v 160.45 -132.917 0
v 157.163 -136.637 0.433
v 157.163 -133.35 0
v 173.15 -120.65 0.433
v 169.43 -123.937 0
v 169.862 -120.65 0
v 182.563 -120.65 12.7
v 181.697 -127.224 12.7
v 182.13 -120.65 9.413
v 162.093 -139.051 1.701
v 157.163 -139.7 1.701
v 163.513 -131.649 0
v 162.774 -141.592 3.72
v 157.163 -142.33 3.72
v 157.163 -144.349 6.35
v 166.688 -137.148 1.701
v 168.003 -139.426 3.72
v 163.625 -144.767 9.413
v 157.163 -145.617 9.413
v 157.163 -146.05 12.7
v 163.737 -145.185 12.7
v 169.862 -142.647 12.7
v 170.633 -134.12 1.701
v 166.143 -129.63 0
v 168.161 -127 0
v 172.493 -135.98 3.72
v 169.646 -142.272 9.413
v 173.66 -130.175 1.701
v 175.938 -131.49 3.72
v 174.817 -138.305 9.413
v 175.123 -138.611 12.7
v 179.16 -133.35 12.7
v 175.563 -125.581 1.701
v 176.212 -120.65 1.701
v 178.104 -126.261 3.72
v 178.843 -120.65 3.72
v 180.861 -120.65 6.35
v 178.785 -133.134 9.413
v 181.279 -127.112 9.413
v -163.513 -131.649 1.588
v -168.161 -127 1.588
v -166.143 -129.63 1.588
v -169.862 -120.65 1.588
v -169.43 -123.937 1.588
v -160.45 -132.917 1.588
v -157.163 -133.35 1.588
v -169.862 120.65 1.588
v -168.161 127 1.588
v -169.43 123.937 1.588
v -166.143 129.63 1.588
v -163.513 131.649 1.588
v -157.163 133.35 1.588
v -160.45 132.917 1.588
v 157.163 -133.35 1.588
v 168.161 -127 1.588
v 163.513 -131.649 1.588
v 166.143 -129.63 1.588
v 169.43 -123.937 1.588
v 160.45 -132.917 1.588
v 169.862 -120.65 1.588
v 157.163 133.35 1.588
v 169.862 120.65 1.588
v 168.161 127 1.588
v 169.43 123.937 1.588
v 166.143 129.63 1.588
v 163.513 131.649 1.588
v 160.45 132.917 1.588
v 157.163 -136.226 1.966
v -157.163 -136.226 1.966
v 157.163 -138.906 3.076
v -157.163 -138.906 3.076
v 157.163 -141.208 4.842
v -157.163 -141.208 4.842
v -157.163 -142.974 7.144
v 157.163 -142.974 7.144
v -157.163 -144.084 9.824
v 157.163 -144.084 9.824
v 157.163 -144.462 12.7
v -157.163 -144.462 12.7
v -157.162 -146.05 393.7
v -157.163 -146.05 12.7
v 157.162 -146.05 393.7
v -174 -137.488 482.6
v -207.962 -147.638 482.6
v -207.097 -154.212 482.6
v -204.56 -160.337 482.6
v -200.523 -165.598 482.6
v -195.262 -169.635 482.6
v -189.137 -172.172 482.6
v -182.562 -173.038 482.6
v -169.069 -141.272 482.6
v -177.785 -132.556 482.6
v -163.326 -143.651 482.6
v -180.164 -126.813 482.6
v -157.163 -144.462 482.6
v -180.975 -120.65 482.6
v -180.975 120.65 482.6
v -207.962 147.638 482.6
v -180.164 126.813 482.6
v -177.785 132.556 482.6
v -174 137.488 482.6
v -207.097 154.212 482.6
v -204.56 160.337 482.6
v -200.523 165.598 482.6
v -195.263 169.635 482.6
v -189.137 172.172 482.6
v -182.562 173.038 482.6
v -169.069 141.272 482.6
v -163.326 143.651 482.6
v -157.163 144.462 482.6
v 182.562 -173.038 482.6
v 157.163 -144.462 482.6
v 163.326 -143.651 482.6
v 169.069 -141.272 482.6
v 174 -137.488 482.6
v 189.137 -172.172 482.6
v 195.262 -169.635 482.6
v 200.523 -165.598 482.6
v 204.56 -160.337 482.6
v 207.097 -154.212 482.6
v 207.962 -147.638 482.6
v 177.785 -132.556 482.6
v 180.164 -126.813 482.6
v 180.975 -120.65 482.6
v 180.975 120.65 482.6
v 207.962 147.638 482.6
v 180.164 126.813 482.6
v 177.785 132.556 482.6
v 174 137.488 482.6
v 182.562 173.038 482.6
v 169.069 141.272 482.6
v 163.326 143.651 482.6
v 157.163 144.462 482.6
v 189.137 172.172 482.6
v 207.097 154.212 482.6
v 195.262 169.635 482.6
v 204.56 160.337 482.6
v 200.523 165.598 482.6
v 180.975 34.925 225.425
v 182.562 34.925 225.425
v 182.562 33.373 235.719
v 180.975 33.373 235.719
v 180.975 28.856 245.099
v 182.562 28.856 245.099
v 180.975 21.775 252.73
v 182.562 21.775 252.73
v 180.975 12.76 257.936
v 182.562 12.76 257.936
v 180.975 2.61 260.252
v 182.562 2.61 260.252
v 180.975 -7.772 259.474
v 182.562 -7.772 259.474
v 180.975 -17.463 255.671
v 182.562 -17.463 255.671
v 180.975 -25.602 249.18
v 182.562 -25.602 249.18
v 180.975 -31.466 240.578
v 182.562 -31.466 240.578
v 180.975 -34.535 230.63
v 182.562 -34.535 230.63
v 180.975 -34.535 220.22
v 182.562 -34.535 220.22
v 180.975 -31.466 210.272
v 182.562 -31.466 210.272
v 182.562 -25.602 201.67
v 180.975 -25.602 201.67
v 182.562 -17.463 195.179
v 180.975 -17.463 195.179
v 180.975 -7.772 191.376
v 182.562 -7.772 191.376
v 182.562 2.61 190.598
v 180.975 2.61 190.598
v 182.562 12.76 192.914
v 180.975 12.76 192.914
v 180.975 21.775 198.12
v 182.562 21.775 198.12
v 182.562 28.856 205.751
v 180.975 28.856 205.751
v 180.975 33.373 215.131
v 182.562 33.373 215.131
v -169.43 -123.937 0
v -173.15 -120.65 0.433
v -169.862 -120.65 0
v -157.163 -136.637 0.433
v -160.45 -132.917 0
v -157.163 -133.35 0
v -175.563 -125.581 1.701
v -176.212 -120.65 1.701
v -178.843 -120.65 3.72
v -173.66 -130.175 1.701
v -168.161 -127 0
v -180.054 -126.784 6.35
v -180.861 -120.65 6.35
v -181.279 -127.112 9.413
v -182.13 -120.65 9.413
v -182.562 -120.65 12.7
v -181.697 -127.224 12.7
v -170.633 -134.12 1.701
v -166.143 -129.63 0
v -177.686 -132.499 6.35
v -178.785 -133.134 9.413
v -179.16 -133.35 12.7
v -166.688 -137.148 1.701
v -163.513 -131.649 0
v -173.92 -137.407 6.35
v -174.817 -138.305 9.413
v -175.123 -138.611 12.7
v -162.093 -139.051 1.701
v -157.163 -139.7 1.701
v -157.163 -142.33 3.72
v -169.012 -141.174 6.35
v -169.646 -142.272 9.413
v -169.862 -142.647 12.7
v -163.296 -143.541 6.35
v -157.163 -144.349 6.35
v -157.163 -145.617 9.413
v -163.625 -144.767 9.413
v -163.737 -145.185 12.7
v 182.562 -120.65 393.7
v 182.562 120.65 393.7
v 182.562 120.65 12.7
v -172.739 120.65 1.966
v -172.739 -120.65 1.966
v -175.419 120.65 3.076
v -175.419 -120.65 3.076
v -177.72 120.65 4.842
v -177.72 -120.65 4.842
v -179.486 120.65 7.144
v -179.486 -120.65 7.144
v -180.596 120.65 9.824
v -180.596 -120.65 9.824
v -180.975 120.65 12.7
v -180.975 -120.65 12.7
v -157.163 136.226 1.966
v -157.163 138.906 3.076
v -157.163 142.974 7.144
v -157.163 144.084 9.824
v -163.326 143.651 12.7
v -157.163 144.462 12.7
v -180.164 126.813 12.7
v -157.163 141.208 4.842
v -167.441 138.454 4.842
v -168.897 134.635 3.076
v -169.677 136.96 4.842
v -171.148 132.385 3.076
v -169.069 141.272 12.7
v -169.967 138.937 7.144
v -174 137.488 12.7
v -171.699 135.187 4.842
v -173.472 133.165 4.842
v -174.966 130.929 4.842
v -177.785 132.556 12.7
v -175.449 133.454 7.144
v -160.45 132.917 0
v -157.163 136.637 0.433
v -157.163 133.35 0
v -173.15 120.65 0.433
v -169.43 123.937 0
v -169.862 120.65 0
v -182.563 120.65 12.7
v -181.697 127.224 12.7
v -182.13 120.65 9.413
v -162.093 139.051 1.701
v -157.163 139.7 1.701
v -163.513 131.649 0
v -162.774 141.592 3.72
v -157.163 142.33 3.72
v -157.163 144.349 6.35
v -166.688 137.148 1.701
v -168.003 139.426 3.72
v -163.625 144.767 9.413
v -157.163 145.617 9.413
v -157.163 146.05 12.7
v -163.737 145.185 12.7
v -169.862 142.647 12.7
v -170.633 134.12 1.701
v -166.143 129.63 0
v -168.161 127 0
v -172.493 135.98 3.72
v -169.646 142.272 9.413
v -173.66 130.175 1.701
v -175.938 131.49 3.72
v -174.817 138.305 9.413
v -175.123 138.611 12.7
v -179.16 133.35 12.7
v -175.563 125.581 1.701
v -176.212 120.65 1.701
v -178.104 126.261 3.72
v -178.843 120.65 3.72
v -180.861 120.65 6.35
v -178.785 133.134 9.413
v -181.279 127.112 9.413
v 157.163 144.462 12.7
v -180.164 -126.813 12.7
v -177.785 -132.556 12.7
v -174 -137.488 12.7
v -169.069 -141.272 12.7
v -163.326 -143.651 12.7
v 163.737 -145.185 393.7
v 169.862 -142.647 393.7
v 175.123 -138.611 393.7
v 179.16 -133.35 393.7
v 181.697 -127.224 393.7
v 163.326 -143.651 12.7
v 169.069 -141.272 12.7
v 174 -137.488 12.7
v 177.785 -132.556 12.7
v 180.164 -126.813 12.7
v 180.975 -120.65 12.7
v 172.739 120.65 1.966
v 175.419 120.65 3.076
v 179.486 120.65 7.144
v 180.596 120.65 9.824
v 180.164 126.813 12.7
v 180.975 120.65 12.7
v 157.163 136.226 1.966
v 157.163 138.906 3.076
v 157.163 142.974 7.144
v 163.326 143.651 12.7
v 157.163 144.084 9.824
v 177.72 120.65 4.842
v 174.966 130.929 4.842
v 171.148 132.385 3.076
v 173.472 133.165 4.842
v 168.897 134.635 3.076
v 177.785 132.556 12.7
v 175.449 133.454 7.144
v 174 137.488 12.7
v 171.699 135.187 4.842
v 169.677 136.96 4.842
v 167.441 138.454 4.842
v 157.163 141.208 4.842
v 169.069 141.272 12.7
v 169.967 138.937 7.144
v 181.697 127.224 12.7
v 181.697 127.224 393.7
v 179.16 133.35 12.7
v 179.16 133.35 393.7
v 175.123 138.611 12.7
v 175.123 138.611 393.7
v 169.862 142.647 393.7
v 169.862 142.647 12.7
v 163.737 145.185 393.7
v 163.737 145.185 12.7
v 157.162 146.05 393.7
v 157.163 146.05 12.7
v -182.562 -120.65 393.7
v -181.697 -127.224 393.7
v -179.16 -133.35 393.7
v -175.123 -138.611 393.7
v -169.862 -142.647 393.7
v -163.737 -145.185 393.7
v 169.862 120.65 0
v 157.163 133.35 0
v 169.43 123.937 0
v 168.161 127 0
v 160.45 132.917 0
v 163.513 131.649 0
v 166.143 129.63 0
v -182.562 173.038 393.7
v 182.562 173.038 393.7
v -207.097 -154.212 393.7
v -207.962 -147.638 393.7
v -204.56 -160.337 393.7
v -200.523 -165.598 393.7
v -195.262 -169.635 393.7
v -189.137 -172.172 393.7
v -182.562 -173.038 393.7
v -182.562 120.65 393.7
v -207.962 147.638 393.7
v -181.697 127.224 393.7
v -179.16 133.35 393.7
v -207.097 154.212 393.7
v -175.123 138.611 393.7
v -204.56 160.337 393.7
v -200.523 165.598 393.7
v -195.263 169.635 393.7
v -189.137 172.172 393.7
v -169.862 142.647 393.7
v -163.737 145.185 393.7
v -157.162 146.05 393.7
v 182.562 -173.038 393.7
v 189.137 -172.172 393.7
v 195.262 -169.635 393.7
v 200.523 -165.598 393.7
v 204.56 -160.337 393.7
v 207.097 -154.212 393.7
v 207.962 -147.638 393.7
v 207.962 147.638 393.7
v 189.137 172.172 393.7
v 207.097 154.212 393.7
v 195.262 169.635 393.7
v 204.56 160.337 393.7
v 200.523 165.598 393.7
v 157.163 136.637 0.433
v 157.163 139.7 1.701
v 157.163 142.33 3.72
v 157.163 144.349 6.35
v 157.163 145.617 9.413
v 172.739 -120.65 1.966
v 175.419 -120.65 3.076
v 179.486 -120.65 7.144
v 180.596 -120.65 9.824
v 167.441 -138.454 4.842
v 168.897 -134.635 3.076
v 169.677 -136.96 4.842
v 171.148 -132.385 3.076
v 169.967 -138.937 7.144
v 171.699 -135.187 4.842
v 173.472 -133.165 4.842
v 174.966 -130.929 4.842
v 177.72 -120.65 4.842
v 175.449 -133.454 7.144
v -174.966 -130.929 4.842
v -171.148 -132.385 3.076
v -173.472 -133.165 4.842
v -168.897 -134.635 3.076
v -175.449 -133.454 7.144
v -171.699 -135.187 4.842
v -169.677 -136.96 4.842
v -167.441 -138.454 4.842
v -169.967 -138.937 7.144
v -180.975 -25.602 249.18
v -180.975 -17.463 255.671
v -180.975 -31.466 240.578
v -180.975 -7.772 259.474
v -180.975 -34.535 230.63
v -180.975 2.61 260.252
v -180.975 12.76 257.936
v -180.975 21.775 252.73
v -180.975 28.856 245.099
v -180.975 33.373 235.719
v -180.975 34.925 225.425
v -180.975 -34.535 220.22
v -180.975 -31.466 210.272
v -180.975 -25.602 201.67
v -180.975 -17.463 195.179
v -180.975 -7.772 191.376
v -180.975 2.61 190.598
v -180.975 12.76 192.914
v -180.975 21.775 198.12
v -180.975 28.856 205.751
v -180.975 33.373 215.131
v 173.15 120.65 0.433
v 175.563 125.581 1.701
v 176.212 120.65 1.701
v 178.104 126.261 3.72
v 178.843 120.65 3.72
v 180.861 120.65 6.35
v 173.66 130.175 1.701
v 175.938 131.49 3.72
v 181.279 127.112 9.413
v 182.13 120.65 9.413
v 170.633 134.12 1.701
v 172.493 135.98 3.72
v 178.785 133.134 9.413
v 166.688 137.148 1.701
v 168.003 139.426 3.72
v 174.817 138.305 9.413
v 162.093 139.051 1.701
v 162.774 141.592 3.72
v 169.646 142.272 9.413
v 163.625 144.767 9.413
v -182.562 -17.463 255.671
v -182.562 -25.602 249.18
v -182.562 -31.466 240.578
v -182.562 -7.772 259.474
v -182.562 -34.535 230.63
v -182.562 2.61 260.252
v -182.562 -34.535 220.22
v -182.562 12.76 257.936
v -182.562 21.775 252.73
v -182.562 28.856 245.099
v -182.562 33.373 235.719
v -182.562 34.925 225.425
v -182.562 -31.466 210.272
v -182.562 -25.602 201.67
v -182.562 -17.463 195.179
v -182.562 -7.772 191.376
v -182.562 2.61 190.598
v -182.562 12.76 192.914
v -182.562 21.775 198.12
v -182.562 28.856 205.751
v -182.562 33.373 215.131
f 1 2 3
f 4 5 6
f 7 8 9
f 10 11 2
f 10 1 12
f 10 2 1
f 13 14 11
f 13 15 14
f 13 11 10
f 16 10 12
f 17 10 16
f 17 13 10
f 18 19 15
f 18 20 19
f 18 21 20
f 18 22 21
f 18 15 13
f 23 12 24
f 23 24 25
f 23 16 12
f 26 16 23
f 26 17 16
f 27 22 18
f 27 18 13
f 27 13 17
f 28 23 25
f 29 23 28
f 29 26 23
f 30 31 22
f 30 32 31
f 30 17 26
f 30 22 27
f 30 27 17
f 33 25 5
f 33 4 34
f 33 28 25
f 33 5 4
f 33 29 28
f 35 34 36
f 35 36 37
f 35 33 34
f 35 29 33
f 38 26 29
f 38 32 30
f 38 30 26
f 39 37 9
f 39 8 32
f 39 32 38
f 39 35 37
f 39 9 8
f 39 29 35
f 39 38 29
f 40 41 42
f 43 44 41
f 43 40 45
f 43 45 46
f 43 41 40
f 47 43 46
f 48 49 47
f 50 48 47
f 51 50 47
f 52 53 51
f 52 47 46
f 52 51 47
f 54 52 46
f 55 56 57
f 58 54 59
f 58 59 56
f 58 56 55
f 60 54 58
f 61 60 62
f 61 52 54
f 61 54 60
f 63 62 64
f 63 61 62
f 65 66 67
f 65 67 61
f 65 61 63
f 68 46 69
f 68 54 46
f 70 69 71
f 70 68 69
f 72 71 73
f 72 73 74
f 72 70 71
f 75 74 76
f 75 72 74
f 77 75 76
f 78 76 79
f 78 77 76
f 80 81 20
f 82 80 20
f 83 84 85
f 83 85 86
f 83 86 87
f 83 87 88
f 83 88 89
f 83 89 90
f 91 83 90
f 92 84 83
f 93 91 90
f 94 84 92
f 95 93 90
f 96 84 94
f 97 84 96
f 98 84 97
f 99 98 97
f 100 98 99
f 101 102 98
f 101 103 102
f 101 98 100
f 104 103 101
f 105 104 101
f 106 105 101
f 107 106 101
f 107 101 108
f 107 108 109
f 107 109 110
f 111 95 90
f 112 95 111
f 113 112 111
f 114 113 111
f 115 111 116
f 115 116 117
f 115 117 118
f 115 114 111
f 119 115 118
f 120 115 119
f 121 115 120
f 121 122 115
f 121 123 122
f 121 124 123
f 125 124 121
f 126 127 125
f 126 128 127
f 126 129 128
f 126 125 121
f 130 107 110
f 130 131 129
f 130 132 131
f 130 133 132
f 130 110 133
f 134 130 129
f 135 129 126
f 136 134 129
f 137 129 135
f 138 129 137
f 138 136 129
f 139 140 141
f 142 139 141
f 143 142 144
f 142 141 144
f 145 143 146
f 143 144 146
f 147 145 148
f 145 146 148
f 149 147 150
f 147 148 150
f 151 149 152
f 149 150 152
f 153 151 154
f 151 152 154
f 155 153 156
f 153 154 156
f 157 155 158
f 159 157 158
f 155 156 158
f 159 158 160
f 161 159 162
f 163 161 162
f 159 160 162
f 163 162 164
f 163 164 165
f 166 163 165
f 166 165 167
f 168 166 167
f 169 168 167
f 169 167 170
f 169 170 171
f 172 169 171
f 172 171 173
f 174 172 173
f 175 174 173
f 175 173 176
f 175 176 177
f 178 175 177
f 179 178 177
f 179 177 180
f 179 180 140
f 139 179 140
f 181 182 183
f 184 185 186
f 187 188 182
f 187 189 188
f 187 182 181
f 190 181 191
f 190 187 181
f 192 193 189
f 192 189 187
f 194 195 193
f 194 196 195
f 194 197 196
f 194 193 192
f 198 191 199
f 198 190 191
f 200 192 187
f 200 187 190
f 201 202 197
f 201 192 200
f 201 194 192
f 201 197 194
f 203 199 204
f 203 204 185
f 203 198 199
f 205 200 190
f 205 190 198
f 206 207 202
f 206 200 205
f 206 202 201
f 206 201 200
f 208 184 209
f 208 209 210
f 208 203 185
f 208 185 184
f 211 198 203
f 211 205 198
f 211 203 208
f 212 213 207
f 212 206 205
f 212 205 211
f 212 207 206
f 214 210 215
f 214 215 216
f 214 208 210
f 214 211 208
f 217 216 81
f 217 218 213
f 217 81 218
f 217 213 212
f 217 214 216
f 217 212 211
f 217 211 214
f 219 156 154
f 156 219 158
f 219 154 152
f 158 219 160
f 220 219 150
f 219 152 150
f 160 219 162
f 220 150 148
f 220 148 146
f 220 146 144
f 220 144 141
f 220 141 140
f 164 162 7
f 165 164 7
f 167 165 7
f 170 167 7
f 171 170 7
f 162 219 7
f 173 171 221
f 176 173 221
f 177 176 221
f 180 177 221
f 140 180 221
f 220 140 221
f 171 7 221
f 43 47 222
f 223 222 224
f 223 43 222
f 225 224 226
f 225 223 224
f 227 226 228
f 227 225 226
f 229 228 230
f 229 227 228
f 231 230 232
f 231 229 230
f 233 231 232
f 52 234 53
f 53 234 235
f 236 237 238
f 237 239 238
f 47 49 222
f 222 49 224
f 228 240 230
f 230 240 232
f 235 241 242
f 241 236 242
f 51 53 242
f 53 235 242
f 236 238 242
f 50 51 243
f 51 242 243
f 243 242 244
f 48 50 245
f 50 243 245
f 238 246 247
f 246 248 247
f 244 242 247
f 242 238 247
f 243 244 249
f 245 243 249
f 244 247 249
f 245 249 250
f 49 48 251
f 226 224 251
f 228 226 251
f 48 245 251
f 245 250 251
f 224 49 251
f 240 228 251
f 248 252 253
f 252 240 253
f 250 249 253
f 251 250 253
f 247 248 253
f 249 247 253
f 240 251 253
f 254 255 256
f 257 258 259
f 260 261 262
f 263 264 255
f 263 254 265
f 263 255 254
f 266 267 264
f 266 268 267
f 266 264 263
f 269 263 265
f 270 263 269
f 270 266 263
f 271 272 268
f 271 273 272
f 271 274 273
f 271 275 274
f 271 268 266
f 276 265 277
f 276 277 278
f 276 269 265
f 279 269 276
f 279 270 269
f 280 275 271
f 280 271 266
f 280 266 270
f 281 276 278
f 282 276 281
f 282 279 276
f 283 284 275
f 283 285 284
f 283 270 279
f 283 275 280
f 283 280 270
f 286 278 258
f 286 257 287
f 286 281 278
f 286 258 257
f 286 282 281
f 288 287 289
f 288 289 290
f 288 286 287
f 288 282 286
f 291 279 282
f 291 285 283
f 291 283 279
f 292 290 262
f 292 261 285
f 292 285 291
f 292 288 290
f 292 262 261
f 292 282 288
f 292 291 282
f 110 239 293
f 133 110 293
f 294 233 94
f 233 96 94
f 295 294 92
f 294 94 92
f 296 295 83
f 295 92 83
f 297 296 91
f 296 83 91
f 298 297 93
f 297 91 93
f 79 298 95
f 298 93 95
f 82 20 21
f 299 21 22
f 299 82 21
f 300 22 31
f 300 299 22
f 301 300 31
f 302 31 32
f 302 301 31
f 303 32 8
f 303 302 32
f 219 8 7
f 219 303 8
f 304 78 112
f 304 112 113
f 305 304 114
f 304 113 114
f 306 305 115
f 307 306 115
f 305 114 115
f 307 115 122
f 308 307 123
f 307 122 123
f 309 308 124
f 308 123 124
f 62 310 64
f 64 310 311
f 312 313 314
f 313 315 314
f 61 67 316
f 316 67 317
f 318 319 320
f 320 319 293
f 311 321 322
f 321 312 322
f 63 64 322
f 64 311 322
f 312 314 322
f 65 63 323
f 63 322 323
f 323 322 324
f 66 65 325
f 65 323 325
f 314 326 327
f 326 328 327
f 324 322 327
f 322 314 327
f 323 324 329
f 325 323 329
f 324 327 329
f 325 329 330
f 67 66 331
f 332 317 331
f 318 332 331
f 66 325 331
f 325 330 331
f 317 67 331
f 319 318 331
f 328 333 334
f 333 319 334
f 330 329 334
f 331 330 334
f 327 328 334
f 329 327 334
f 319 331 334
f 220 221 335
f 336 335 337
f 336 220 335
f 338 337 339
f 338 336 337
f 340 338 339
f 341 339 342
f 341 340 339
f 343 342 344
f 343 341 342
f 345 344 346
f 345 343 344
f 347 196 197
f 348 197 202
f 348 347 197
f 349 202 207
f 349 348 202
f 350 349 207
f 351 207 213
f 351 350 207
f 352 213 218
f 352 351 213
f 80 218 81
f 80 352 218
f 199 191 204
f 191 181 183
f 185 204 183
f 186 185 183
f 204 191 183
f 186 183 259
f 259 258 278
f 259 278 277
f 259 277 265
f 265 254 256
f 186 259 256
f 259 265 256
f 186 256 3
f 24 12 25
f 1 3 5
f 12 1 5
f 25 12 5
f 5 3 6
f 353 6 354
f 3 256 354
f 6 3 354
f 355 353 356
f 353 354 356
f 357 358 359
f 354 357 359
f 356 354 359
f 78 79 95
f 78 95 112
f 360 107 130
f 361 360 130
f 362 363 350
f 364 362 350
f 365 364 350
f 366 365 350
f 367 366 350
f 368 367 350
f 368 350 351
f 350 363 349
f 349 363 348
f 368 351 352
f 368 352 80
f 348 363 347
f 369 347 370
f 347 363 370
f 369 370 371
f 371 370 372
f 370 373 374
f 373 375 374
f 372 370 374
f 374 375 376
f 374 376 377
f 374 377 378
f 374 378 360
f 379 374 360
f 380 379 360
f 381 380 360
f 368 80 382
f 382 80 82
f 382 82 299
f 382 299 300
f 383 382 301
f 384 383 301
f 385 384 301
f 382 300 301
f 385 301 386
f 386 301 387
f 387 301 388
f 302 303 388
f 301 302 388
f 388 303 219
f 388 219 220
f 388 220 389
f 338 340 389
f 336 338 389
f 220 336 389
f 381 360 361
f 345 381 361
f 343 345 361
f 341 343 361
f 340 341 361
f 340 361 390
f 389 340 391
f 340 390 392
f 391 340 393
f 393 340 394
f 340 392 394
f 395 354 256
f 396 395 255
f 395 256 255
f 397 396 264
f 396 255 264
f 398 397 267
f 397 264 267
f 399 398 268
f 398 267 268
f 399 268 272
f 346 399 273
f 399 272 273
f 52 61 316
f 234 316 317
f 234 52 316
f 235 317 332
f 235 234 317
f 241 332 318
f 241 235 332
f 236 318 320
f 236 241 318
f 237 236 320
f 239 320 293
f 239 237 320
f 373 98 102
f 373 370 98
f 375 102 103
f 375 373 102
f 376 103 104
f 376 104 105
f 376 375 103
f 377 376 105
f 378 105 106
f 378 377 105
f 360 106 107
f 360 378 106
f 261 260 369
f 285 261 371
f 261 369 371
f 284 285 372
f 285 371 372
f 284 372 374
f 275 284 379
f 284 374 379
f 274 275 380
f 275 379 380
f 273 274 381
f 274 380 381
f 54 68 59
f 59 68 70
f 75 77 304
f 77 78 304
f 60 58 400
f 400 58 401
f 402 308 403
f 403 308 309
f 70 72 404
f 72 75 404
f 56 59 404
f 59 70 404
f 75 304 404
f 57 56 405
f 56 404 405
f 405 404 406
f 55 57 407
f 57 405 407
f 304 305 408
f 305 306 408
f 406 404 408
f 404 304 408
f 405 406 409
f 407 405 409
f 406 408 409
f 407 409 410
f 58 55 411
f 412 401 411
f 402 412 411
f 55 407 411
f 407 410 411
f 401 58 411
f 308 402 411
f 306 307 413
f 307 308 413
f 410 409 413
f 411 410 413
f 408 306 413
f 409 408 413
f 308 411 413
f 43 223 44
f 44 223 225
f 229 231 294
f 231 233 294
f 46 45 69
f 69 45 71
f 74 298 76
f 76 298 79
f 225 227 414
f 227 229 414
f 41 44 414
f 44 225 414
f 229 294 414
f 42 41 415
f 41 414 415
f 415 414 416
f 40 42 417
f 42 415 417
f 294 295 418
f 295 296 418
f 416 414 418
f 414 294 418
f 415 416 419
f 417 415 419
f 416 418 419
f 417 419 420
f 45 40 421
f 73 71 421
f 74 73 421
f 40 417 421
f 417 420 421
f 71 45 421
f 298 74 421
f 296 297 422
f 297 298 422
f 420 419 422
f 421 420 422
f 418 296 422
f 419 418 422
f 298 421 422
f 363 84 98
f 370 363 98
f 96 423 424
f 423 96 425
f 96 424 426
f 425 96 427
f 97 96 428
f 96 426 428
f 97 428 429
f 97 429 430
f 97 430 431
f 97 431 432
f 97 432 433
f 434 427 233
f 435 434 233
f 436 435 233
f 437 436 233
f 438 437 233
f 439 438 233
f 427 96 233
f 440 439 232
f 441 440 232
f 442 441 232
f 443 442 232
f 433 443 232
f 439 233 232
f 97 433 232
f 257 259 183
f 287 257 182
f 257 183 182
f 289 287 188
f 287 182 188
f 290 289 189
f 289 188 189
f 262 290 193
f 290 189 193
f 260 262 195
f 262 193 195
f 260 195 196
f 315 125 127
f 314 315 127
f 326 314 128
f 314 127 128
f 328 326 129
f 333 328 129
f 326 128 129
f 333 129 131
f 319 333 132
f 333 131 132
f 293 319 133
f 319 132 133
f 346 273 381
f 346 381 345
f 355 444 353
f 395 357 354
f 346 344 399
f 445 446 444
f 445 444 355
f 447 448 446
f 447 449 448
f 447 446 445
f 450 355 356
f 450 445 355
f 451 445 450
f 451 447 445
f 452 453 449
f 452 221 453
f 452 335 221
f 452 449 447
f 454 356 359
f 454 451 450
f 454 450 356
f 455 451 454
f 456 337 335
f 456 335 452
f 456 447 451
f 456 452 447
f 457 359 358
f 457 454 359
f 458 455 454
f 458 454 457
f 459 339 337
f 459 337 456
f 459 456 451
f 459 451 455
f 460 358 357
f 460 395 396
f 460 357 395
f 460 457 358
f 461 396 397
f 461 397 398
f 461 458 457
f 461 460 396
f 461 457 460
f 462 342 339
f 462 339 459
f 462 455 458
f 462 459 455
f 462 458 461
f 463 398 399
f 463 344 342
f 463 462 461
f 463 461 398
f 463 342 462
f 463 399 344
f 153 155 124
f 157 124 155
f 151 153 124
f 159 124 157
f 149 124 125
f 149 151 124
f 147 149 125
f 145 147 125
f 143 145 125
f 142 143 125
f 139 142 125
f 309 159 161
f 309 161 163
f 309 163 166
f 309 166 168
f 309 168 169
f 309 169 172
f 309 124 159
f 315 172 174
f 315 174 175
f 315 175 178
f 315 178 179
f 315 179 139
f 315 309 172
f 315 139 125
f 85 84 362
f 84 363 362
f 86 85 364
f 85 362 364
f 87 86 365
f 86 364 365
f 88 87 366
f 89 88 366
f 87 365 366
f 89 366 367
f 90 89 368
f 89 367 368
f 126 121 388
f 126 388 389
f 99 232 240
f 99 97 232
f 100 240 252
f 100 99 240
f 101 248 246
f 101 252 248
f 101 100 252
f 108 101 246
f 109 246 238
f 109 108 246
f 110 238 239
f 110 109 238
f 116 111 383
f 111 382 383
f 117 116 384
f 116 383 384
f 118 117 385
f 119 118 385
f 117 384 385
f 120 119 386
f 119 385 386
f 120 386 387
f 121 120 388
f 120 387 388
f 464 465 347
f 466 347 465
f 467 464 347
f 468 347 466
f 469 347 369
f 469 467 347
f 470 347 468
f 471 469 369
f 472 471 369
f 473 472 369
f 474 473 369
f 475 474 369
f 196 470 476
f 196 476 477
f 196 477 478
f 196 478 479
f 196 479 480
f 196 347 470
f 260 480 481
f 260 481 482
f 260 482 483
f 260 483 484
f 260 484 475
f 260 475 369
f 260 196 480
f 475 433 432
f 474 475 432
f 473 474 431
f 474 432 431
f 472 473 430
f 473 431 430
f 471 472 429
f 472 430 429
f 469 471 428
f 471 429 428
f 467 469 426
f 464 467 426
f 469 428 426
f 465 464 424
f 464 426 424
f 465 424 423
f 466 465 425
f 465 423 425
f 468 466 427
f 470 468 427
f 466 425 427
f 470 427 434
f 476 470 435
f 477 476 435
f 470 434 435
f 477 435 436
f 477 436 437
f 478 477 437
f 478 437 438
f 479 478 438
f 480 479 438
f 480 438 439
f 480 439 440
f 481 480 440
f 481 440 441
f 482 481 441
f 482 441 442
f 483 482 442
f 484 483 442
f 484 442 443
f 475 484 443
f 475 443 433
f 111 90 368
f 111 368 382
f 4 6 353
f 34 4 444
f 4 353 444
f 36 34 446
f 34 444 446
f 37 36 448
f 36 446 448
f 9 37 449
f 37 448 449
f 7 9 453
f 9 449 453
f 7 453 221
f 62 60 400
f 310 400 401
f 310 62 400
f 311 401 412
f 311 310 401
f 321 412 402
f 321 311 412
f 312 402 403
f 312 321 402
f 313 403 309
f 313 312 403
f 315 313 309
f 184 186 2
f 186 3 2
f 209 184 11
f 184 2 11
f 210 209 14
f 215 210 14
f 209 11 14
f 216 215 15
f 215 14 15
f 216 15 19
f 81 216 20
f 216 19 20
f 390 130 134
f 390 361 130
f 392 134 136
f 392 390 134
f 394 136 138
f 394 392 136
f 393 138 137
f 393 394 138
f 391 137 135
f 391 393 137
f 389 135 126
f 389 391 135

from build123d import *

# Parameters (mm, degrees)
F0_W     = 365.125
F0_H     = 292.1
F1_DEPTH = 482.6
F2_R     = 25.4
F3_R     = 12.7
F4_T     = -1.5875
F5_R     = 34.925
F6_DEPTH = 365.126
F7_W     = 415.925
F7_H     = 346.075
F8_DEPTH = 88.9
F9_R     = 25.4


with BuildPart() as f1:
    # F0 (on Top) → F1 (new body)
    with BuildSketch(Plane.XY):
        Rectangle(F0_W, F0_H)
    extrude(amount=F1_DEPTH)

    # F2
    f2_edges = [f1.edges().sort_by_distance(p)[0] for p in [
        (-182.5625, -146.05, 241.3),
        (182.5625, -146.05, 241.3),
        (182.5625, 146.05, 241.3),
        (-182.5625, 146.05, 241.3),
    ]]
    fillet(f2_edges, radius=F2_R)

    # F3
    f3_edges = [f1.edges().sort_by_distance(p)[0] for p in [
        (0, -146.05, 0),
    ]]
    fillet(f3_edges, radius=F3_R)

    # F4
    f4_openings = [f1.faces().sort_by_distance(p)[0] for p in [
        (0, 0, 482.6),
    ]]
    offset(amount=F4_T, openings=f4_openings)

    # F5 (on face) → F6 (cut, through all)
    with BuildSketch(Plane.YZ.offset(182.5625)):
        with Locations((0, 225.425)):
            Circle(F5_R)
    extrude(amount=-F6_DEPTH, mode=Mode.SUBTRACT)

    # F7 (on face) → F8 (join)
    with BuildSketch(Plane.XY.offset(482.6)):
        Rectangle(F7_W, F7_H)
        with BuildLine():
            Line((-182.5625, -120.65), (-182.5625, 120.65))
            ThreePointArc((-182.5625, 120.65), (-175.123012, 138.610512), (-157.1625, 146.05))
            Line((-157.1625, 146.05), (157.1625, 146.05))
            ThreePointArc((157.1625, 146.05), (175.123012, 138.610512), (182.5625, 120.65))
            Line((182.5625, 120.65), (182.5625, -120.65))
            ThreePointArc((182.5625, -120.65), (175.123012, -138.610512), (157.1625, -146.05))
            Line((157.1625, -146.05), (-157.1625, -146.05))
            ThreePointArc((-157.1625, -146.05), (-175.123012, -138.610512), (-182.5625, -120.65))
        make_face(mode=Mode.SUBTRACT)
    extrude(amount=-F8_DEPTH)

    # F9
    f9_edges = [f1.edges().sort_by_distance(p)[0] for p in [
        (-207.9625, -173.0375, 438.15),
        (207.9625, -173.0375, 438.15),
        (207.9625, 173.0375, 438.15),
        (-207.9625, 173.0375, 438.15),
    ]]
    fillet(f9_edges, radius=F9_R)


solid = f1.part
